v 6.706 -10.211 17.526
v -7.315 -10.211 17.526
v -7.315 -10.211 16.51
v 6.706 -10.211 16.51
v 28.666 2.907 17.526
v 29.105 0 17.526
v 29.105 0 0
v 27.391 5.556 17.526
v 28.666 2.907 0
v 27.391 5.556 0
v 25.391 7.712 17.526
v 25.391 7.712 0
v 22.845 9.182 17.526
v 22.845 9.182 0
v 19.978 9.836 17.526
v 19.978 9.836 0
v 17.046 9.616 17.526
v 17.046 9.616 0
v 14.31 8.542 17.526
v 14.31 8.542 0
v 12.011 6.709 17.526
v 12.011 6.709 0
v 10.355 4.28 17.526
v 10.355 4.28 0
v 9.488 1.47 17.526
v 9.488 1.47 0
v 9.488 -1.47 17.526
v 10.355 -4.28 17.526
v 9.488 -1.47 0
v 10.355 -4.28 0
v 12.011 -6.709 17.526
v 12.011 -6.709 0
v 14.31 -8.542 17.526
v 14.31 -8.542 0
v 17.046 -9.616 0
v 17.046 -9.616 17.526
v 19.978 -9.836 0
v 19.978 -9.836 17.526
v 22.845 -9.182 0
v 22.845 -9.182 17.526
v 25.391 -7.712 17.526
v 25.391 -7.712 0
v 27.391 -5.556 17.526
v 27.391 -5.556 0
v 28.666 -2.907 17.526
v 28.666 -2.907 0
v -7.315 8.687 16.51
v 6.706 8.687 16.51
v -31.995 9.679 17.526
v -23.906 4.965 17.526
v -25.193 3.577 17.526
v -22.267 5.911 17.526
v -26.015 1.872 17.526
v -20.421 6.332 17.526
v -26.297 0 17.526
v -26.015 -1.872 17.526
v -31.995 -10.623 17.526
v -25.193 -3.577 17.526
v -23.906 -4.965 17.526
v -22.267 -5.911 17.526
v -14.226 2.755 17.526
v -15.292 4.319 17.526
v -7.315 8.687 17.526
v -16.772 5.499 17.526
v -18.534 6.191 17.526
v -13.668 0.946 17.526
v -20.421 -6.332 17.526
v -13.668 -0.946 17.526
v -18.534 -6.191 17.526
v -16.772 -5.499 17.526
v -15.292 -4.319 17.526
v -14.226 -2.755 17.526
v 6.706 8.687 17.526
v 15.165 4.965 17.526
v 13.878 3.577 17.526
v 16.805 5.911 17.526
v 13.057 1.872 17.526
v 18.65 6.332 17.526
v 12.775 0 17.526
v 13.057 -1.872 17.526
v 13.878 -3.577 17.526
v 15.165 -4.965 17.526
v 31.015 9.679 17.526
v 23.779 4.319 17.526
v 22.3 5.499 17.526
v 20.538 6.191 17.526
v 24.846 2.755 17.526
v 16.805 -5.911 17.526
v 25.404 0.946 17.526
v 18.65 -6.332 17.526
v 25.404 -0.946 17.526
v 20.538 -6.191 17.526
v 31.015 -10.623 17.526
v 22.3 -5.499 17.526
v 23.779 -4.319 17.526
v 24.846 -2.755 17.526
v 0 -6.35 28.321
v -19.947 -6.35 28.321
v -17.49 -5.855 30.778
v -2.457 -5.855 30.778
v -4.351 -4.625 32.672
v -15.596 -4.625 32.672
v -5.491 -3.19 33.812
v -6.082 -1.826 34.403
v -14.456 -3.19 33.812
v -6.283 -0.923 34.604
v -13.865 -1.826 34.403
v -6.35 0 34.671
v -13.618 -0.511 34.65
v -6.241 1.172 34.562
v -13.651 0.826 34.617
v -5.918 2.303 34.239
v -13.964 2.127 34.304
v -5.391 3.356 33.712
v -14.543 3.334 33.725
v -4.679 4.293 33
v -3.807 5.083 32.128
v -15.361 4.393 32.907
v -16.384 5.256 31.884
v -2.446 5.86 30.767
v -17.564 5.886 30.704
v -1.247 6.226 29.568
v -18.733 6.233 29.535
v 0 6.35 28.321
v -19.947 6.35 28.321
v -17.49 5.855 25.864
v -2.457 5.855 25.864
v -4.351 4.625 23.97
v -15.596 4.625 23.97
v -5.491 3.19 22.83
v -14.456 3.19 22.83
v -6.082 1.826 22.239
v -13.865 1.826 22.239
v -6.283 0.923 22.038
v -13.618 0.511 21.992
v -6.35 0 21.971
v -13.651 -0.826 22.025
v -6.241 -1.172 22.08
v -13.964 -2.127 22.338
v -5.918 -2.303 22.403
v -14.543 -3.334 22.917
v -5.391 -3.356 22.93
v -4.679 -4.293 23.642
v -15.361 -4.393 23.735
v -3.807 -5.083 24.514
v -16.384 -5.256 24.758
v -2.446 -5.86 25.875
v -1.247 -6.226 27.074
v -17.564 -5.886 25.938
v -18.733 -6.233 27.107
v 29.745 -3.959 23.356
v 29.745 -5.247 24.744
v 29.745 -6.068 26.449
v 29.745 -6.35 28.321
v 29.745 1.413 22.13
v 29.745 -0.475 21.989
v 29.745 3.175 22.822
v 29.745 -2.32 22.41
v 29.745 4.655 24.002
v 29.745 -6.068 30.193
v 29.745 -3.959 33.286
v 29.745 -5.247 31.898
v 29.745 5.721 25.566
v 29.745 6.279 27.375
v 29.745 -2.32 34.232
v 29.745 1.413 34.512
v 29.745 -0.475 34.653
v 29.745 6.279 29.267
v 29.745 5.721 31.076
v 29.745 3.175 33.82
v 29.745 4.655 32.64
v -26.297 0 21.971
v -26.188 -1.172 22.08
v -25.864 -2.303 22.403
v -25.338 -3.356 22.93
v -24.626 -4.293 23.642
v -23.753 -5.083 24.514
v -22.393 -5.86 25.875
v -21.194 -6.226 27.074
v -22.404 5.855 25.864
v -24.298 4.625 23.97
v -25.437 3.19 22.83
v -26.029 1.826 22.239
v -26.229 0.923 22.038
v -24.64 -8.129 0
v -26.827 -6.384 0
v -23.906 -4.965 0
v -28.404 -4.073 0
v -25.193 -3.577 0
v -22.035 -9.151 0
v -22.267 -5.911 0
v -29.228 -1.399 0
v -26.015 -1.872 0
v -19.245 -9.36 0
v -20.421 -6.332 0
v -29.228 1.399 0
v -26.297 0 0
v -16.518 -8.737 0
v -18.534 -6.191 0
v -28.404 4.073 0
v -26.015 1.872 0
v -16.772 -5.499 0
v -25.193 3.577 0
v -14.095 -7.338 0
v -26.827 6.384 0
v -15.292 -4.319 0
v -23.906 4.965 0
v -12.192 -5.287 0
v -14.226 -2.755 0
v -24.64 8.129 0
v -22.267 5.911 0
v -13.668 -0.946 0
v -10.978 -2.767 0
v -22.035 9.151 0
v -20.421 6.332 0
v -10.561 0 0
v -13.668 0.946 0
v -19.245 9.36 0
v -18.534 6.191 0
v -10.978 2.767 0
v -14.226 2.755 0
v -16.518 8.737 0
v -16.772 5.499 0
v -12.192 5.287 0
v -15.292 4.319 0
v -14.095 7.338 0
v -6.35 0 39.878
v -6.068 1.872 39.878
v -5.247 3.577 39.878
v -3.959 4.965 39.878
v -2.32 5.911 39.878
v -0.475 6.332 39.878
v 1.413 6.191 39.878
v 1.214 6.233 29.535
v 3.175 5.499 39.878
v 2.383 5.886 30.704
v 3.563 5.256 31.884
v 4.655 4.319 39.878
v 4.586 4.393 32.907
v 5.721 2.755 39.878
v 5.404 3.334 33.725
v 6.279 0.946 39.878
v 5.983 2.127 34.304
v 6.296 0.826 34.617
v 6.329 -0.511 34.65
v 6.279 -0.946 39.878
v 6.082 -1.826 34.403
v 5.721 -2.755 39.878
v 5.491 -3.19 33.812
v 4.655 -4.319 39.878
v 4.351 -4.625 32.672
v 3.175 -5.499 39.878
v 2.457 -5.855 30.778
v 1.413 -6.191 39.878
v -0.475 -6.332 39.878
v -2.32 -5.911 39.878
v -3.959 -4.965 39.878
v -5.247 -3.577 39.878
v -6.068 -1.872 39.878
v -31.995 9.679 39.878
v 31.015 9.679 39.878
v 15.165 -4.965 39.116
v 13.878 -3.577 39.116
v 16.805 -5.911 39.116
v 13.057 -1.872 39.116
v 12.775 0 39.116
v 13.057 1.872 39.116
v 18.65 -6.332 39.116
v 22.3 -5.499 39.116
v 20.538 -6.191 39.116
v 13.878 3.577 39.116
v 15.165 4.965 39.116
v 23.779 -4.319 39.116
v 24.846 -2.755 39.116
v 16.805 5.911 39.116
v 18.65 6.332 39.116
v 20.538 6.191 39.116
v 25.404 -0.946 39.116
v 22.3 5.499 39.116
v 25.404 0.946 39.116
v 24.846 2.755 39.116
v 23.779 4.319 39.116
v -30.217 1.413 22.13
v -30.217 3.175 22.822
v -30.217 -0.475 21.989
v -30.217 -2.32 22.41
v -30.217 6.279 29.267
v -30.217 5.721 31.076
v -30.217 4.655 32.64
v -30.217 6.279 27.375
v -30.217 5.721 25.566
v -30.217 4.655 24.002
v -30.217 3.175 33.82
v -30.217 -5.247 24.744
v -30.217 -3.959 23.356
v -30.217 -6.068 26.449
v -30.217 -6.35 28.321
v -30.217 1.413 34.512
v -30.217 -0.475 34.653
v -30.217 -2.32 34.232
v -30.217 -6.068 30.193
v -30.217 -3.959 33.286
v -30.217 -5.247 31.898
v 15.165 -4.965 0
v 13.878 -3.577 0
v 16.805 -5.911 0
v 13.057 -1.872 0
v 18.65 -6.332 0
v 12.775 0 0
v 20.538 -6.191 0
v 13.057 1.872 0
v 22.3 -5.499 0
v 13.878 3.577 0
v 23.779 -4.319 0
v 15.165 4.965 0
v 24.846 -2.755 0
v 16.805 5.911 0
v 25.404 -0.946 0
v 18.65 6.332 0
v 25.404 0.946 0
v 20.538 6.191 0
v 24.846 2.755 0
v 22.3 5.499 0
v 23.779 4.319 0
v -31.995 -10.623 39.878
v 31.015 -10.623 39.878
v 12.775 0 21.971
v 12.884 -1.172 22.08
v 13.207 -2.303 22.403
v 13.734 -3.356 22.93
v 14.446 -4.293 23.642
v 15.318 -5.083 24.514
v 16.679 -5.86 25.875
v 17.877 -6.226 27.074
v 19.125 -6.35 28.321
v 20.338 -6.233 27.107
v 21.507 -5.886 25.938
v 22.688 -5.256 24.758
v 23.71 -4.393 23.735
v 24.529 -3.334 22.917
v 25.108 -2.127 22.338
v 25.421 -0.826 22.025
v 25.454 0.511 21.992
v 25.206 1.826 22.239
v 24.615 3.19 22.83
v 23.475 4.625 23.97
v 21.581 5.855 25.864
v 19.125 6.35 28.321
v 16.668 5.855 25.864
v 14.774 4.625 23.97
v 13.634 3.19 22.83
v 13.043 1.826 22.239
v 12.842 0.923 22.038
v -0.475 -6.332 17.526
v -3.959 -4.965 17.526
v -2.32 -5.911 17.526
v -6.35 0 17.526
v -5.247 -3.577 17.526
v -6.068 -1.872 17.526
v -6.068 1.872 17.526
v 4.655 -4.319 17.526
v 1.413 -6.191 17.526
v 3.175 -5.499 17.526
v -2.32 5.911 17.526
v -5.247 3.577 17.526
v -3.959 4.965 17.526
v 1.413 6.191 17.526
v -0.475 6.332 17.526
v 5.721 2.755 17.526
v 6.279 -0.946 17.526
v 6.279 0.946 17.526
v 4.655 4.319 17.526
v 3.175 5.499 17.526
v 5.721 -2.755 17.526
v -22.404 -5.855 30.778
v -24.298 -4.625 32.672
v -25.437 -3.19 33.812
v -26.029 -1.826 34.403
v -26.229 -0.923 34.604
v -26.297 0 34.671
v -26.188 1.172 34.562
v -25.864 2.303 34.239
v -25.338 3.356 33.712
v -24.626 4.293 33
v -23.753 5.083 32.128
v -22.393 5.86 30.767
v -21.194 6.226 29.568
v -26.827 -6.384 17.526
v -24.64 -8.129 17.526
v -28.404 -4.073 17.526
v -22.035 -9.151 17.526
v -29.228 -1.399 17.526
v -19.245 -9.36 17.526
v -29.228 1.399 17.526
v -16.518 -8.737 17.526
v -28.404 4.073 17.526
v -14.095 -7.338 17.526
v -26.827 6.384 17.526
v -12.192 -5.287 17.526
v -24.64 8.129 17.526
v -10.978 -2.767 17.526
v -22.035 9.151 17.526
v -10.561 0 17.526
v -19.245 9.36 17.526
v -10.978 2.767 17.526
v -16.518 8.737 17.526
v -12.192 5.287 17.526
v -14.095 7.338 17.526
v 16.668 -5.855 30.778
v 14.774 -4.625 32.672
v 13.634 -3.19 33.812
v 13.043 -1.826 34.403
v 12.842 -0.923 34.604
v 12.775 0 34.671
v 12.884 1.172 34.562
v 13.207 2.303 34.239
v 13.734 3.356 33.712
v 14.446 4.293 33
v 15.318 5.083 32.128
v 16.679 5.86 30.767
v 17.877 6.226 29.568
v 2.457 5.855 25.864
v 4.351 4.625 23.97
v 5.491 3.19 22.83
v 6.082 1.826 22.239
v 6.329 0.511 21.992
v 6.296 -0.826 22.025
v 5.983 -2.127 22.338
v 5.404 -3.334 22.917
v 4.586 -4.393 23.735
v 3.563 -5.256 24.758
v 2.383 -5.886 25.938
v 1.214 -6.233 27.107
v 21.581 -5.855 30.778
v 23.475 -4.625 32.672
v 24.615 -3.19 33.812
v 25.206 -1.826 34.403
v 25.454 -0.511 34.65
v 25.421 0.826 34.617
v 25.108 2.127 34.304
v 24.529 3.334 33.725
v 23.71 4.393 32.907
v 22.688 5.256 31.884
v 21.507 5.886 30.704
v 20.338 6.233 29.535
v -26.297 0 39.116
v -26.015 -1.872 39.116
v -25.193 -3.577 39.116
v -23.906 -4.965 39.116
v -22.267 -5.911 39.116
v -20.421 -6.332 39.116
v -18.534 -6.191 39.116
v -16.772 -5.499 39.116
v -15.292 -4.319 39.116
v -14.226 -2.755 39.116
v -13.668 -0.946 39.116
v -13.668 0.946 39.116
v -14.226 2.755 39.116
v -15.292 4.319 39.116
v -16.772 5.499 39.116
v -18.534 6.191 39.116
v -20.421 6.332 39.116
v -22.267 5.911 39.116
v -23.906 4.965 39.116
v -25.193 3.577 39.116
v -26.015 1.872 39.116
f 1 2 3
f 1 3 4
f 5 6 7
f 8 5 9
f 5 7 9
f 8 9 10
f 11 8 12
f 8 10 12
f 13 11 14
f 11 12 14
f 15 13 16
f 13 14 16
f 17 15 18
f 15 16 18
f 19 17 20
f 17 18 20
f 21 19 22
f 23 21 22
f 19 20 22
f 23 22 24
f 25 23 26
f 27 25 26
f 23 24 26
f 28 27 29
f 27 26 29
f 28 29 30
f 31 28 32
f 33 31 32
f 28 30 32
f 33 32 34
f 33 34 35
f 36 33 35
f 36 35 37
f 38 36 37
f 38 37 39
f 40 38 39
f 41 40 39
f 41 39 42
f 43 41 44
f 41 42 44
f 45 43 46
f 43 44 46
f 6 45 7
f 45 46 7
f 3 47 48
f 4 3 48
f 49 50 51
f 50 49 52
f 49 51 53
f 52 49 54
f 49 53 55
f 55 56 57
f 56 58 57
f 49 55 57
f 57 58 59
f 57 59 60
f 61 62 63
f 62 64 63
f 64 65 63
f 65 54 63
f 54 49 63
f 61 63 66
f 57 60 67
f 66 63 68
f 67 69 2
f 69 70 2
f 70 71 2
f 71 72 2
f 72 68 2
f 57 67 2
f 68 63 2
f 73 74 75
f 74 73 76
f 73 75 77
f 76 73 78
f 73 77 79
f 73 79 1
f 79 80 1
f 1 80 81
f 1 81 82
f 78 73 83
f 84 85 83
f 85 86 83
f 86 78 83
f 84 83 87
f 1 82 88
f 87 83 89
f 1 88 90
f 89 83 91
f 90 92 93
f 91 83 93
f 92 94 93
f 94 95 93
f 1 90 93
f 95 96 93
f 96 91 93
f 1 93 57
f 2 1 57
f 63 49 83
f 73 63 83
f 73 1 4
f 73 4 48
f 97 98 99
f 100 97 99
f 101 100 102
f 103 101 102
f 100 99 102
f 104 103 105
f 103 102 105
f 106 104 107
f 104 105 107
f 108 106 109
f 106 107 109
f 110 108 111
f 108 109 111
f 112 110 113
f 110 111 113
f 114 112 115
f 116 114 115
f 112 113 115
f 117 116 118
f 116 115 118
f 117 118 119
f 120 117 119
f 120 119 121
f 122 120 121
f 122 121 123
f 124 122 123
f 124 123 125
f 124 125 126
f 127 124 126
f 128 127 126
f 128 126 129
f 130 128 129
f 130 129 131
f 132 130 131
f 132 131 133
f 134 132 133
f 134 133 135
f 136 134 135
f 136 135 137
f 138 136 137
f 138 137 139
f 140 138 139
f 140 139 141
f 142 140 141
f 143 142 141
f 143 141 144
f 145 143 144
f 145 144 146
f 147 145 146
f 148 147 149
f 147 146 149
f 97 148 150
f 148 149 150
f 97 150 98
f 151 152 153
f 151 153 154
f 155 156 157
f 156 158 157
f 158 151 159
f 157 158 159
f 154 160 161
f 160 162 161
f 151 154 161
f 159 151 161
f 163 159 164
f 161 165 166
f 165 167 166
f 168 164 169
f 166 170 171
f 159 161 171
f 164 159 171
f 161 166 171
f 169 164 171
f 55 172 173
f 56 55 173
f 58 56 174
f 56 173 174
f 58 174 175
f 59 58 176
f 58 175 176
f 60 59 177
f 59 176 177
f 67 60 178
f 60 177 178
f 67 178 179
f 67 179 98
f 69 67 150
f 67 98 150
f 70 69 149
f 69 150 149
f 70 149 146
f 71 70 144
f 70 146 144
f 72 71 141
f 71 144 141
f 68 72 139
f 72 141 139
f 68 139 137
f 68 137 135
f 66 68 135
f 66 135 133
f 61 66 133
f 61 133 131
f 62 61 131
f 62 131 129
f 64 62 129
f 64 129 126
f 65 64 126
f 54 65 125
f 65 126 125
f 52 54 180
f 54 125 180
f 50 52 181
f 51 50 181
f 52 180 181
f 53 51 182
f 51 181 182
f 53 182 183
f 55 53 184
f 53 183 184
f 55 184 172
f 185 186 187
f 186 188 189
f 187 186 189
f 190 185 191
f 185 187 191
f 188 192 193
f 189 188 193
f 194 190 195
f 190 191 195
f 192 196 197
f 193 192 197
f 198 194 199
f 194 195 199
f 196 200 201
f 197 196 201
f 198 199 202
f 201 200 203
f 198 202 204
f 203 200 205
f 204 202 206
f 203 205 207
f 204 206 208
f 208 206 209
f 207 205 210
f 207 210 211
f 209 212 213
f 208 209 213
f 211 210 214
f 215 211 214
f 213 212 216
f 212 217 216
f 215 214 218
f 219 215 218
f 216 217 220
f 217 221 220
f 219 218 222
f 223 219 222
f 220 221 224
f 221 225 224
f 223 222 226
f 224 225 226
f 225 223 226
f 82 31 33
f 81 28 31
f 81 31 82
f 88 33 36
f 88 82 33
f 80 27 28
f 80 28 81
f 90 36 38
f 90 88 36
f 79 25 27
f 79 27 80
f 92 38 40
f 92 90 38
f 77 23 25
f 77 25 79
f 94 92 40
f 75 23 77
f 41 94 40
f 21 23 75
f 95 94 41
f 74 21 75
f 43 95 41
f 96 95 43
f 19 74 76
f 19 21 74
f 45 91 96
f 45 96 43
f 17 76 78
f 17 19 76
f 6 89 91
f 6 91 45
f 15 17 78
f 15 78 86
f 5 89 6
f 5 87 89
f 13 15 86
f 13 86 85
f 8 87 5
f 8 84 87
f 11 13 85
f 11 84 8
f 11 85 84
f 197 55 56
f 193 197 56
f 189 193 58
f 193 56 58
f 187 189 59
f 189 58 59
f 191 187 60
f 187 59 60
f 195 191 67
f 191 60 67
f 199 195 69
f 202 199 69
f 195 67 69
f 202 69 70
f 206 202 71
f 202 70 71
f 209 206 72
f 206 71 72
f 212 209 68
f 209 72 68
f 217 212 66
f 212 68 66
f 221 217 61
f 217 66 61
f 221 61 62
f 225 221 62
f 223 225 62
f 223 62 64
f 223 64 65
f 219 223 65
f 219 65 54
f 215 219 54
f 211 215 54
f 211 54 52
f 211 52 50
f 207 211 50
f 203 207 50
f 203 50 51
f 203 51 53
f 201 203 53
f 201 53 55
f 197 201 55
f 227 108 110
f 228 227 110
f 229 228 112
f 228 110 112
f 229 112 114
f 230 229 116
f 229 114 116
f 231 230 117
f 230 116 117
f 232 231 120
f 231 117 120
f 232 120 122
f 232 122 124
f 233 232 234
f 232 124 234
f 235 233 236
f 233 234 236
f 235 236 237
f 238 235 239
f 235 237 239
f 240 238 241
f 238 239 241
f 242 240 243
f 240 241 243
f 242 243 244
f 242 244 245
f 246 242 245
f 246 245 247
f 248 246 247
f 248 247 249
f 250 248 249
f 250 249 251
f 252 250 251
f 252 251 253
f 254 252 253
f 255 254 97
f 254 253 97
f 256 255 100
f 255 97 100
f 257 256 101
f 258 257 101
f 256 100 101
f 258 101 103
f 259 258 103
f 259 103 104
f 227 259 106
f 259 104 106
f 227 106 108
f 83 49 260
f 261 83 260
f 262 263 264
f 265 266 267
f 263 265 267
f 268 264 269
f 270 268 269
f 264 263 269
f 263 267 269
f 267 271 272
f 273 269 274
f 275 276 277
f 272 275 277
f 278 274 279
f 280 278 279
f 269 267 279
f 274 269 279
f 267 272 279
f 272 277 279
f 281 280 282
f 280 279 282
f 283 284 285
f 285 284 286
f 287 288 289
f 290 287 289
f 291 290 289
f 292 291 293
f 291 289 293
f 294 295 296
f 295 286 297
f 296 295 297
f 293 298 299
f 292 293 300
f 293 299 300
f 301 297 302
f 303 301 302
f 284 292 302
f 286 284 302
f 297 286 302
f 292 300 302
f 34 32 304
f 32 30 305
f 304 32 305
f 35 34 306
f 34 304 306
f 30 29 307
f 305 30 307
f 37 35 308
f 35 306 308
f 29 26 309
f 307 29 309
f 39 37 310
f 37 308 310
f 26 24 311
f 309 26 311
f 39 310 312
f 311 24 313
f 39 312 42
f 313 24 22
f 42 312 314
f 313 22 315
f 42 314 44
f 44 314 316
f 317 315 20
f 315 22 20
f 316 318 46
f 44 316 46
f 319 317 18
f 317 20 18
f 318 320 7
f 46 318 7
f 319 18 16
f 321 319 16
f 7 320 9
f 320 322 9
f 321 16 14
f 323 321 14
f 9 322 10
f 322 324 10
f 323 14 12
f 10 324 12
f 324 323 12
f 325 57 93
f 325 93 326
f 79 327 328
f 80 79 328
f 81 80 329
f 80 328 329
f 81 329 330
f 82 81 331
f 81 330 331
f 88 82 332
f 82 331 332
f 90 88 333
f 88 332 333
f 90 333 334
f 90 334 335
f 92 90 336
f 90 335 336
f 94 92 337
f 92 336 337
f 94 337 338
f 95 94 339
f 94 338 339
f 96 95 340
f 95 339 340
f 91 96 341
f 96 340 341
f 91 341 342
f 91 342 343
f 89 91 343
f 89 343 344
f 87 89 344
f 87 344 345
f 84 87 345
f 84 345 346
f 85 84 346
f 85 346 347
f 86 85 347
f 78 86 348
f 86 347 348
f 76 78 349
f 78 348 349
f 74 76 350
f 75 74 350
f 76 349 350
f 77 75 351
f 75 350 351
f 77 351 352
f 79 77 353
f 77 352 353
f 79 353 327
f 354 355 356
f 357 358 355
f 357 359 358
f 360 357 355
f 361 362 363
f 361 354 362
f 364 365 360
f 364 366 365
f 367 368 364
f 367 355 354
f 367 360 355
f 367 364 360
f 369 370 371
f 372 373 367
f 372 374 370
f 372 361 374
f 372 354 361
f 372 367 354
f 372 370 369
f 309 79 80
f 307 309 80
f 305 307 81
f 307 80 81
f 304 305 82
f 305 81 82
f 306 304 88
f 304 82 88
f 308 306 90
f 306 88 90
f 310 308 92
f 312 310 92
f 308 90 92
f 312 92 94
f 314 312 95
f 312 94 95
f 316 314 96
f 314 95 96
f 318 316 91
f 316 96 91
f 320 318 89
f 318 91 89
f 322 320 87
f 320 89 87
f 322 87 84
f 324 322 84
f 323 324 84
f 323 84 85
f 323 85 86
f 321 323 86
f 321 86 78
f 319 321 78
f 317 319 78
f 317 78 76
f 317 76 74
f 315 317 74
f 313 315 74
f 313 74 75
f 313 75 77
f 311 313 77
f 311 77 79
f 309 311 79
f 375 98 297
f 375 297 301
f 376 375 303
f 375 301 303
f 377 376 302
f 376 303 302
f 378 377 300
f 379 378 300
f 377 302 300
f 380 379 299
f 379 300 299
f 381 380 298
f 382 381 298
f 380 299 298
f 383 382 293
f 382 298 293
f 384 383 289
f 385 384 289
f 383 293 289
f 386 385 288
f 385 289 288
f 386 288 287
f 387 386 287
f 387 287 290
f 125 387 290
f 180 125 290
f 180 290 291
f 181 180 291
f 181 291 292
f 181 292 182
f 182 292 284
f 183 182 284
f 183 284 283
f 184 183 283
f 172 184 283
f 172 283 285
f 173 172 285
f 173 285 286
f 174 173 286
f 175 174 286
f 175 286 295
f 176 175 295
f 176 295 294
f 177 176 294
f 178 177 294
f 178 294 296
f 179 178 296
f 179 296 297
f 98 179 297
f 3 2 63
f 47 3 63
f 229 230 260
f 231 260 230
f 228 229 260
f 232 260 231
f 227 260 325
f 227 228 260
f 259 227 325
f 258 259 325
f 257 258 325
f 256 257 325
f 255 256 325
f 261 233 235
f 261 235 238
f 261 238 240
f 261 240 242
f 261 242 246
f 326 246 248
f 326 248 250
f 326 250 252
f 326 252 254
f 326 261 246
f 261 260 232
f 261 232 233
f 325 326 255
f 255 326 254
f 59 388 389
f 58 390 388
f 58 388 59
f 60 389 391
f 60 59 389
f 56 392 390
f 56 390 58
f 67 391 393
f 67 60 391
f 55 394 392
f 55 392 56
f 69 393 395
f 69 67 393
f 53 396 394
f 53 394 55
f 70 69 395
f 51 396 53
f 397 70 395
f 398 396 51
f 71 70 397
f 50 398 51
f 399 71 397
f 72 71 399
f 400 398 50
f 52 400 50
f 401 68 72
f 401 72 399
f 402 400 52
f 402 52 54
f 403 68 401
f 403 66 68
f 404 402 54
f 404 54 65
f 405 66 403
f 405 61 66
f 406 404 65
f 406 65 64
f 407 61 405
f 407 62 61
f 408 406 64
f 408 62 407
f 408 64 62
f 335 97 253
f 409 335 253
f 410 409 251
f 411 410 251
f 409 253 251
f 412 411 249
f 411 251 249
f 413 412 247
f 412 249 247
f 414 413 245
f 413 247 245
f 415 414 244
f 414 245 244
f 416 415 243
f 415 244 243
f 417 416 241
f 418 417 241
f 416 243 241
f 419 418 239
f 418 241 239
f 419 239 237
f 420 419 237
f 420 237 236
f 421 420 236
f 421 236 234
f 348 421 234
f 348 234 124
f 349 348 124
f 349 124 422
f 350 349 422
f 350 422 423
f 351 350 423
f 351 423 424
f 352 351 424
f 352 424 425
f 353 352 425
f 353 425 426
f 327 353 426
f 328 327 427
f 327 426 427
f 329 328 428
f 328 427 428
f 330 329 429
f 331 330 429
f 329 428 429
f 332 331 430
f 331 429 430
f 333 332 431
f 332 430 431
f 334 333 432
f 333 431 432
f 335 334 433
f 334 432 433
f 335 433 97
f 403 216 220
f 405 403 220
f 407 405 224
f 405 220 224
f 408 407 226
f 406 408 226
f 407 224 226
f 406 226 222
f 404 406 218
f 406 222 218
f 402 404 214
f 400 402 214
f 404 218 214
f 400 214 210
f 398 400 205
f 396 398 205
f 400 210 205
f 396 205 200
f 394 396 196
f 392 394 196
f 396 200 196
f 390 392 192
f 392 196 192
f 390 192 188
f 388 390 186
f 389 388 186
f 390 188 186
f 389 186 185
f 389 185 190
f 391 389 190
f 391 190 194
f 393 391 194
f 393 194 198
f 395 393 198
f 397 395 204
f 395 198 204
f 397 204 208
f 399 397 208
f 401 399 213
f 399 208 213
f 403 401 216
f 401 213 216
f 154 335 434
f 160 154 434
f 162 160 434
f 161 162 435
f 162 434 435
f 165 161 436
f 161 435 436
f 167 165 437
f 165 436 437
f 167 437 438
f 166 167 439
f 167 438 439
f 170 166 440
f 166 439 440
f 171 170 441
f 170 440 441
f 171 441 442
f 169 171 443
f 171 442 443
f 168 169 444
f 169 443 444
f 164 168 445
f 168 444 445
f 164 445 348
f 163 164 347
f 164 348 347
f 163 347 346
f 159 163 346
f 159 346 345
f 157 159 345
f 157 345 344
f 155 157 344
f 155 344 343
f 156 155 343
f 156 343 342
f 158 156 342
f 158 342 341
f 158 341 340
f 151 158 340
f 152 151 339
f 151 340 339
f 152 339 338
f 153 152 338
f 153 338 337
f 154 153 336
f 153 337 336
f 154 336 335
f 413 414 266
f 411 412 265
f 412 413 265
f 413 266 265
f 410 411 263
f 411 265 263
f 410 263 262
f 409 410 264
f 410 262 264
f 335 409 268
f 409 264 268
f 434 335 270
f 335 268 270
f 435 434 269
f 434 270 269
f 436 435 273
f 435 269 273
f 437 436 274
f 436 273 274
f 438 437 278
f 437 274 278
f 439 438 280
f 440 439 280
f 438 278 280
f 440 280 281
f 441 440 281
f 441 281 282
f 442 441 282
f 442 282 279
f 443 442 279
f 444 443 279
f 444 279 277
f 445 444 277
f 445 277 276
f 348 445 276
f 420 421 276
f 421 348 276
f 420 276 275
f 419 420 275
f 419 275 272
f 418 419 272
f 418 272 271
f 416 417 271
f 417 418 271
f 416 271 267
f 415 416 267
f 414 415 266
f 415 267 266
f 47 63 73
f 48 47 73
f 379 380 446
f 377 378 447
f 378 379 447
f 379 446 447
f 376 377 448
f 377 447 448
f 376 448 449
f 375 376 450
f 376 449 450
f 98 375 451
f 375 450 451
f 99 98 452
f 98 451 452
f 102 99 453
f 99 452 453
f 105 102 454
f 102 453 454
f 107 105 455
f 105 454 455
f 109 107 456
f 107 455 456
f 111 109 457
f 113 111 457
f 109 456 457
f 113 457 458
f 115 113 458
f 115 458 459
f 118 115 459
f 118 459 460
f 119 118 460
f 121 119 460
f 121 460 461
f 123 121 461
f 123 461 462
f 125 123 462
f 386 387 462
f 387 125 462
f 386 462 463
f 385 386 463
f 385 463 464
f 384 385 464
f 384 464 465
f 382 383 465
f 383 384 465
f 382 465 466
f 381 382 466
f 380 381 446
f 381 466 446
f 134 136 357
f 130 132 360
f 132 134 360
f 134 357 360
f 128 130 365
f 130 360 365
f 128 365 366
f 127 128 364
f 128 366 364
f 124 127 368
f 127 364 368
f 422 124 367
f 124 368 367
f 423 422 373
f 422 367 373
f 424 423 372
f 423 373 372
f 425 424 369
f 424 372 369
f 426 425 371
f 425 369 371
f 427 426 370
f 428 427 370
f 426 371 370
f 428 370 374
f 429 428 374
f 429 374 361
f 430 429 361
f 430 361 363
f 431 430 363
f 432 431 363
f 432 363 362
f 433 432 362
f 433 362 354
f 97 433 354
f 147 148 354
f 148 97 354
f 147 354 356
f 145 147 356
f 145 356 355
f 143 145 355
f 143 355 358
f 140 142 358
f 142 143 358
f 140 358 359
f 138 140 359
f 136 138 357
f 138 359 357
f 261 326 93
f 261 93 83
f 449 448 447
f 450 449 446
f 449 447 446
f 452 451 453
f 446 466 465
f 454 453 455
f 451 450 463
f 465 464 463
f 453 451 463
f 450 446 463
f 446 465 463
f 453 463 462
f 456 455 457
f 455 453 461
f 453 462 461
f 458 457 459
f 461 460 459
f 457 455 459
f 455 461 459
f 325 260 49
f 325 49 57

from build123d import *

# Parameters (mm, degrees)
F0_R      = 9.3861787979
F1_DEPTH  = 17.526
F0_R_2    = 9.8633855672
F2_W      = 59.9626451731
F2_H      = 20.3023133799
F3_DEPTH  = 21.59
F5_D      = 12.7
F7_D      = 12.7
F7_2_D    = 12.7
F7_3_D    = 12.7
F8_W      = 59.9626451731
F8_H      = 20.3023133799
F9_DEPTH  = 0.762
F10_W     = 20.3023133799
F10_H     = 22.352
F11_DEPTH = 1.27
F12_W     = 20.3023133799
F12_H     = 22.352
F14_DEPTH = 1.778
F15_D     = 12.7
F16_W     = 14.0207996592
F16_H     = 18.8975995407
F17_DEPTH = 1.016


with BuildPart() as f1:
    # F0 (on Top) → F1 (new body)
    with BuildSketch(Plane.XY):
        with Locations((-19.9468769133, 0)):
            Circle(F0_R)
    extrude(amount=F1_DEPTH)

    # F7 (through all)
    with Locations(Plane(origin=(0, 0, 0), x_dir=(1, 0, 0), z_dir=(0, 0, -1))):
        with Locations((-19.9468769133, 0), (19.1245861351, 0)):
            Hole(F7_D / 2)


with BuildPart() as f1b:
    # F0 (on Top) → F1, piece 2 (new body)
    with BuildSketch(Plane.XY):
        with Locations((19.2413087934, 0)):
            Circle(F0_R_2)
    extrude(amount=F1_DEPTH)

    # F7#2 (through all)
    with Locations(Plane(origin=(0, 0, 0), x_dir=(1, 0, 0), z_dir=(0, 0, -1))):
        with Locations((-19.9468769133, 0), (19.1245861351, 0)):
            Hole(F7_2_D / 2)


with BuildPart() as f3:
    # F2 (on face) → F3 (new body)
    with BuildSketch(Plane.XY.offset(17.526)):
        with Locations((-0.2360772341, -0.472149346)):
            Rectangle(F2_W, F2_H)
    extrude(amount=F3_DEPTH)

    # F5 (through all)
    with Locations(Plane.YZ.offset(29.7452453524)):
        with Locations((0, 28.321)):
            Hole(F5_D / 2)

    # F7#3 (through all)
    with Locations(Plane(origin=(0, 0, 0), x_dir=(1, 0, 0), z_dir=(0, 0, -1))):
        with Locations((-19.9468769133, 0), (19.1245861351, 0)):
            Hole(F7_3_D / 2)

    # F8 (on face) → F9 (join)
    with BuildSketch(Plane.XY.offset(39.116)):
        with Locations((-0.2360772341, -0.472149346)):
            Rectangle(F8_W, F8_H)
    extrude(amount=F9_DEPTH)

    # F10 (on face) → F11 (join)
    with BuildSketch(Plane.YZ.offset(29.7452453524)):
        with Locations((-0.472149346, 28.702)):
            Rectangle(F10_W, F10_H)
    extrude(amount=F11_DEPTH)

    # F12 (on face) → F14 (join)
    with BuildSketch(Plane(origin=(-30.2173998207, 0, 0), x_dir=(0, -1, 0), z_dir=(-1, 0, 0))):
        with Locations((0.472149346, 28.702)):
            Rectangle(F12_W, F12_H)
    extrude(amount=F14_DEPTH)

    # F15 (through all)
    with Locations(Plane.XY.offset(39.878)):
        with Locations((0, 0)):
            Hole(F15_D / 2)

    # F16 (on face) → F17 (join)
    with BuildSketch(Plane.XY.offset(17.526)):
        with Locations((-0.3047995269, -0.7620002143)):
            Rectangle(F16_W, F16_H)
    extrude(amount=-F17_DEPTH)


solid = Compound([f1.part, f1b.part, f3.part])
